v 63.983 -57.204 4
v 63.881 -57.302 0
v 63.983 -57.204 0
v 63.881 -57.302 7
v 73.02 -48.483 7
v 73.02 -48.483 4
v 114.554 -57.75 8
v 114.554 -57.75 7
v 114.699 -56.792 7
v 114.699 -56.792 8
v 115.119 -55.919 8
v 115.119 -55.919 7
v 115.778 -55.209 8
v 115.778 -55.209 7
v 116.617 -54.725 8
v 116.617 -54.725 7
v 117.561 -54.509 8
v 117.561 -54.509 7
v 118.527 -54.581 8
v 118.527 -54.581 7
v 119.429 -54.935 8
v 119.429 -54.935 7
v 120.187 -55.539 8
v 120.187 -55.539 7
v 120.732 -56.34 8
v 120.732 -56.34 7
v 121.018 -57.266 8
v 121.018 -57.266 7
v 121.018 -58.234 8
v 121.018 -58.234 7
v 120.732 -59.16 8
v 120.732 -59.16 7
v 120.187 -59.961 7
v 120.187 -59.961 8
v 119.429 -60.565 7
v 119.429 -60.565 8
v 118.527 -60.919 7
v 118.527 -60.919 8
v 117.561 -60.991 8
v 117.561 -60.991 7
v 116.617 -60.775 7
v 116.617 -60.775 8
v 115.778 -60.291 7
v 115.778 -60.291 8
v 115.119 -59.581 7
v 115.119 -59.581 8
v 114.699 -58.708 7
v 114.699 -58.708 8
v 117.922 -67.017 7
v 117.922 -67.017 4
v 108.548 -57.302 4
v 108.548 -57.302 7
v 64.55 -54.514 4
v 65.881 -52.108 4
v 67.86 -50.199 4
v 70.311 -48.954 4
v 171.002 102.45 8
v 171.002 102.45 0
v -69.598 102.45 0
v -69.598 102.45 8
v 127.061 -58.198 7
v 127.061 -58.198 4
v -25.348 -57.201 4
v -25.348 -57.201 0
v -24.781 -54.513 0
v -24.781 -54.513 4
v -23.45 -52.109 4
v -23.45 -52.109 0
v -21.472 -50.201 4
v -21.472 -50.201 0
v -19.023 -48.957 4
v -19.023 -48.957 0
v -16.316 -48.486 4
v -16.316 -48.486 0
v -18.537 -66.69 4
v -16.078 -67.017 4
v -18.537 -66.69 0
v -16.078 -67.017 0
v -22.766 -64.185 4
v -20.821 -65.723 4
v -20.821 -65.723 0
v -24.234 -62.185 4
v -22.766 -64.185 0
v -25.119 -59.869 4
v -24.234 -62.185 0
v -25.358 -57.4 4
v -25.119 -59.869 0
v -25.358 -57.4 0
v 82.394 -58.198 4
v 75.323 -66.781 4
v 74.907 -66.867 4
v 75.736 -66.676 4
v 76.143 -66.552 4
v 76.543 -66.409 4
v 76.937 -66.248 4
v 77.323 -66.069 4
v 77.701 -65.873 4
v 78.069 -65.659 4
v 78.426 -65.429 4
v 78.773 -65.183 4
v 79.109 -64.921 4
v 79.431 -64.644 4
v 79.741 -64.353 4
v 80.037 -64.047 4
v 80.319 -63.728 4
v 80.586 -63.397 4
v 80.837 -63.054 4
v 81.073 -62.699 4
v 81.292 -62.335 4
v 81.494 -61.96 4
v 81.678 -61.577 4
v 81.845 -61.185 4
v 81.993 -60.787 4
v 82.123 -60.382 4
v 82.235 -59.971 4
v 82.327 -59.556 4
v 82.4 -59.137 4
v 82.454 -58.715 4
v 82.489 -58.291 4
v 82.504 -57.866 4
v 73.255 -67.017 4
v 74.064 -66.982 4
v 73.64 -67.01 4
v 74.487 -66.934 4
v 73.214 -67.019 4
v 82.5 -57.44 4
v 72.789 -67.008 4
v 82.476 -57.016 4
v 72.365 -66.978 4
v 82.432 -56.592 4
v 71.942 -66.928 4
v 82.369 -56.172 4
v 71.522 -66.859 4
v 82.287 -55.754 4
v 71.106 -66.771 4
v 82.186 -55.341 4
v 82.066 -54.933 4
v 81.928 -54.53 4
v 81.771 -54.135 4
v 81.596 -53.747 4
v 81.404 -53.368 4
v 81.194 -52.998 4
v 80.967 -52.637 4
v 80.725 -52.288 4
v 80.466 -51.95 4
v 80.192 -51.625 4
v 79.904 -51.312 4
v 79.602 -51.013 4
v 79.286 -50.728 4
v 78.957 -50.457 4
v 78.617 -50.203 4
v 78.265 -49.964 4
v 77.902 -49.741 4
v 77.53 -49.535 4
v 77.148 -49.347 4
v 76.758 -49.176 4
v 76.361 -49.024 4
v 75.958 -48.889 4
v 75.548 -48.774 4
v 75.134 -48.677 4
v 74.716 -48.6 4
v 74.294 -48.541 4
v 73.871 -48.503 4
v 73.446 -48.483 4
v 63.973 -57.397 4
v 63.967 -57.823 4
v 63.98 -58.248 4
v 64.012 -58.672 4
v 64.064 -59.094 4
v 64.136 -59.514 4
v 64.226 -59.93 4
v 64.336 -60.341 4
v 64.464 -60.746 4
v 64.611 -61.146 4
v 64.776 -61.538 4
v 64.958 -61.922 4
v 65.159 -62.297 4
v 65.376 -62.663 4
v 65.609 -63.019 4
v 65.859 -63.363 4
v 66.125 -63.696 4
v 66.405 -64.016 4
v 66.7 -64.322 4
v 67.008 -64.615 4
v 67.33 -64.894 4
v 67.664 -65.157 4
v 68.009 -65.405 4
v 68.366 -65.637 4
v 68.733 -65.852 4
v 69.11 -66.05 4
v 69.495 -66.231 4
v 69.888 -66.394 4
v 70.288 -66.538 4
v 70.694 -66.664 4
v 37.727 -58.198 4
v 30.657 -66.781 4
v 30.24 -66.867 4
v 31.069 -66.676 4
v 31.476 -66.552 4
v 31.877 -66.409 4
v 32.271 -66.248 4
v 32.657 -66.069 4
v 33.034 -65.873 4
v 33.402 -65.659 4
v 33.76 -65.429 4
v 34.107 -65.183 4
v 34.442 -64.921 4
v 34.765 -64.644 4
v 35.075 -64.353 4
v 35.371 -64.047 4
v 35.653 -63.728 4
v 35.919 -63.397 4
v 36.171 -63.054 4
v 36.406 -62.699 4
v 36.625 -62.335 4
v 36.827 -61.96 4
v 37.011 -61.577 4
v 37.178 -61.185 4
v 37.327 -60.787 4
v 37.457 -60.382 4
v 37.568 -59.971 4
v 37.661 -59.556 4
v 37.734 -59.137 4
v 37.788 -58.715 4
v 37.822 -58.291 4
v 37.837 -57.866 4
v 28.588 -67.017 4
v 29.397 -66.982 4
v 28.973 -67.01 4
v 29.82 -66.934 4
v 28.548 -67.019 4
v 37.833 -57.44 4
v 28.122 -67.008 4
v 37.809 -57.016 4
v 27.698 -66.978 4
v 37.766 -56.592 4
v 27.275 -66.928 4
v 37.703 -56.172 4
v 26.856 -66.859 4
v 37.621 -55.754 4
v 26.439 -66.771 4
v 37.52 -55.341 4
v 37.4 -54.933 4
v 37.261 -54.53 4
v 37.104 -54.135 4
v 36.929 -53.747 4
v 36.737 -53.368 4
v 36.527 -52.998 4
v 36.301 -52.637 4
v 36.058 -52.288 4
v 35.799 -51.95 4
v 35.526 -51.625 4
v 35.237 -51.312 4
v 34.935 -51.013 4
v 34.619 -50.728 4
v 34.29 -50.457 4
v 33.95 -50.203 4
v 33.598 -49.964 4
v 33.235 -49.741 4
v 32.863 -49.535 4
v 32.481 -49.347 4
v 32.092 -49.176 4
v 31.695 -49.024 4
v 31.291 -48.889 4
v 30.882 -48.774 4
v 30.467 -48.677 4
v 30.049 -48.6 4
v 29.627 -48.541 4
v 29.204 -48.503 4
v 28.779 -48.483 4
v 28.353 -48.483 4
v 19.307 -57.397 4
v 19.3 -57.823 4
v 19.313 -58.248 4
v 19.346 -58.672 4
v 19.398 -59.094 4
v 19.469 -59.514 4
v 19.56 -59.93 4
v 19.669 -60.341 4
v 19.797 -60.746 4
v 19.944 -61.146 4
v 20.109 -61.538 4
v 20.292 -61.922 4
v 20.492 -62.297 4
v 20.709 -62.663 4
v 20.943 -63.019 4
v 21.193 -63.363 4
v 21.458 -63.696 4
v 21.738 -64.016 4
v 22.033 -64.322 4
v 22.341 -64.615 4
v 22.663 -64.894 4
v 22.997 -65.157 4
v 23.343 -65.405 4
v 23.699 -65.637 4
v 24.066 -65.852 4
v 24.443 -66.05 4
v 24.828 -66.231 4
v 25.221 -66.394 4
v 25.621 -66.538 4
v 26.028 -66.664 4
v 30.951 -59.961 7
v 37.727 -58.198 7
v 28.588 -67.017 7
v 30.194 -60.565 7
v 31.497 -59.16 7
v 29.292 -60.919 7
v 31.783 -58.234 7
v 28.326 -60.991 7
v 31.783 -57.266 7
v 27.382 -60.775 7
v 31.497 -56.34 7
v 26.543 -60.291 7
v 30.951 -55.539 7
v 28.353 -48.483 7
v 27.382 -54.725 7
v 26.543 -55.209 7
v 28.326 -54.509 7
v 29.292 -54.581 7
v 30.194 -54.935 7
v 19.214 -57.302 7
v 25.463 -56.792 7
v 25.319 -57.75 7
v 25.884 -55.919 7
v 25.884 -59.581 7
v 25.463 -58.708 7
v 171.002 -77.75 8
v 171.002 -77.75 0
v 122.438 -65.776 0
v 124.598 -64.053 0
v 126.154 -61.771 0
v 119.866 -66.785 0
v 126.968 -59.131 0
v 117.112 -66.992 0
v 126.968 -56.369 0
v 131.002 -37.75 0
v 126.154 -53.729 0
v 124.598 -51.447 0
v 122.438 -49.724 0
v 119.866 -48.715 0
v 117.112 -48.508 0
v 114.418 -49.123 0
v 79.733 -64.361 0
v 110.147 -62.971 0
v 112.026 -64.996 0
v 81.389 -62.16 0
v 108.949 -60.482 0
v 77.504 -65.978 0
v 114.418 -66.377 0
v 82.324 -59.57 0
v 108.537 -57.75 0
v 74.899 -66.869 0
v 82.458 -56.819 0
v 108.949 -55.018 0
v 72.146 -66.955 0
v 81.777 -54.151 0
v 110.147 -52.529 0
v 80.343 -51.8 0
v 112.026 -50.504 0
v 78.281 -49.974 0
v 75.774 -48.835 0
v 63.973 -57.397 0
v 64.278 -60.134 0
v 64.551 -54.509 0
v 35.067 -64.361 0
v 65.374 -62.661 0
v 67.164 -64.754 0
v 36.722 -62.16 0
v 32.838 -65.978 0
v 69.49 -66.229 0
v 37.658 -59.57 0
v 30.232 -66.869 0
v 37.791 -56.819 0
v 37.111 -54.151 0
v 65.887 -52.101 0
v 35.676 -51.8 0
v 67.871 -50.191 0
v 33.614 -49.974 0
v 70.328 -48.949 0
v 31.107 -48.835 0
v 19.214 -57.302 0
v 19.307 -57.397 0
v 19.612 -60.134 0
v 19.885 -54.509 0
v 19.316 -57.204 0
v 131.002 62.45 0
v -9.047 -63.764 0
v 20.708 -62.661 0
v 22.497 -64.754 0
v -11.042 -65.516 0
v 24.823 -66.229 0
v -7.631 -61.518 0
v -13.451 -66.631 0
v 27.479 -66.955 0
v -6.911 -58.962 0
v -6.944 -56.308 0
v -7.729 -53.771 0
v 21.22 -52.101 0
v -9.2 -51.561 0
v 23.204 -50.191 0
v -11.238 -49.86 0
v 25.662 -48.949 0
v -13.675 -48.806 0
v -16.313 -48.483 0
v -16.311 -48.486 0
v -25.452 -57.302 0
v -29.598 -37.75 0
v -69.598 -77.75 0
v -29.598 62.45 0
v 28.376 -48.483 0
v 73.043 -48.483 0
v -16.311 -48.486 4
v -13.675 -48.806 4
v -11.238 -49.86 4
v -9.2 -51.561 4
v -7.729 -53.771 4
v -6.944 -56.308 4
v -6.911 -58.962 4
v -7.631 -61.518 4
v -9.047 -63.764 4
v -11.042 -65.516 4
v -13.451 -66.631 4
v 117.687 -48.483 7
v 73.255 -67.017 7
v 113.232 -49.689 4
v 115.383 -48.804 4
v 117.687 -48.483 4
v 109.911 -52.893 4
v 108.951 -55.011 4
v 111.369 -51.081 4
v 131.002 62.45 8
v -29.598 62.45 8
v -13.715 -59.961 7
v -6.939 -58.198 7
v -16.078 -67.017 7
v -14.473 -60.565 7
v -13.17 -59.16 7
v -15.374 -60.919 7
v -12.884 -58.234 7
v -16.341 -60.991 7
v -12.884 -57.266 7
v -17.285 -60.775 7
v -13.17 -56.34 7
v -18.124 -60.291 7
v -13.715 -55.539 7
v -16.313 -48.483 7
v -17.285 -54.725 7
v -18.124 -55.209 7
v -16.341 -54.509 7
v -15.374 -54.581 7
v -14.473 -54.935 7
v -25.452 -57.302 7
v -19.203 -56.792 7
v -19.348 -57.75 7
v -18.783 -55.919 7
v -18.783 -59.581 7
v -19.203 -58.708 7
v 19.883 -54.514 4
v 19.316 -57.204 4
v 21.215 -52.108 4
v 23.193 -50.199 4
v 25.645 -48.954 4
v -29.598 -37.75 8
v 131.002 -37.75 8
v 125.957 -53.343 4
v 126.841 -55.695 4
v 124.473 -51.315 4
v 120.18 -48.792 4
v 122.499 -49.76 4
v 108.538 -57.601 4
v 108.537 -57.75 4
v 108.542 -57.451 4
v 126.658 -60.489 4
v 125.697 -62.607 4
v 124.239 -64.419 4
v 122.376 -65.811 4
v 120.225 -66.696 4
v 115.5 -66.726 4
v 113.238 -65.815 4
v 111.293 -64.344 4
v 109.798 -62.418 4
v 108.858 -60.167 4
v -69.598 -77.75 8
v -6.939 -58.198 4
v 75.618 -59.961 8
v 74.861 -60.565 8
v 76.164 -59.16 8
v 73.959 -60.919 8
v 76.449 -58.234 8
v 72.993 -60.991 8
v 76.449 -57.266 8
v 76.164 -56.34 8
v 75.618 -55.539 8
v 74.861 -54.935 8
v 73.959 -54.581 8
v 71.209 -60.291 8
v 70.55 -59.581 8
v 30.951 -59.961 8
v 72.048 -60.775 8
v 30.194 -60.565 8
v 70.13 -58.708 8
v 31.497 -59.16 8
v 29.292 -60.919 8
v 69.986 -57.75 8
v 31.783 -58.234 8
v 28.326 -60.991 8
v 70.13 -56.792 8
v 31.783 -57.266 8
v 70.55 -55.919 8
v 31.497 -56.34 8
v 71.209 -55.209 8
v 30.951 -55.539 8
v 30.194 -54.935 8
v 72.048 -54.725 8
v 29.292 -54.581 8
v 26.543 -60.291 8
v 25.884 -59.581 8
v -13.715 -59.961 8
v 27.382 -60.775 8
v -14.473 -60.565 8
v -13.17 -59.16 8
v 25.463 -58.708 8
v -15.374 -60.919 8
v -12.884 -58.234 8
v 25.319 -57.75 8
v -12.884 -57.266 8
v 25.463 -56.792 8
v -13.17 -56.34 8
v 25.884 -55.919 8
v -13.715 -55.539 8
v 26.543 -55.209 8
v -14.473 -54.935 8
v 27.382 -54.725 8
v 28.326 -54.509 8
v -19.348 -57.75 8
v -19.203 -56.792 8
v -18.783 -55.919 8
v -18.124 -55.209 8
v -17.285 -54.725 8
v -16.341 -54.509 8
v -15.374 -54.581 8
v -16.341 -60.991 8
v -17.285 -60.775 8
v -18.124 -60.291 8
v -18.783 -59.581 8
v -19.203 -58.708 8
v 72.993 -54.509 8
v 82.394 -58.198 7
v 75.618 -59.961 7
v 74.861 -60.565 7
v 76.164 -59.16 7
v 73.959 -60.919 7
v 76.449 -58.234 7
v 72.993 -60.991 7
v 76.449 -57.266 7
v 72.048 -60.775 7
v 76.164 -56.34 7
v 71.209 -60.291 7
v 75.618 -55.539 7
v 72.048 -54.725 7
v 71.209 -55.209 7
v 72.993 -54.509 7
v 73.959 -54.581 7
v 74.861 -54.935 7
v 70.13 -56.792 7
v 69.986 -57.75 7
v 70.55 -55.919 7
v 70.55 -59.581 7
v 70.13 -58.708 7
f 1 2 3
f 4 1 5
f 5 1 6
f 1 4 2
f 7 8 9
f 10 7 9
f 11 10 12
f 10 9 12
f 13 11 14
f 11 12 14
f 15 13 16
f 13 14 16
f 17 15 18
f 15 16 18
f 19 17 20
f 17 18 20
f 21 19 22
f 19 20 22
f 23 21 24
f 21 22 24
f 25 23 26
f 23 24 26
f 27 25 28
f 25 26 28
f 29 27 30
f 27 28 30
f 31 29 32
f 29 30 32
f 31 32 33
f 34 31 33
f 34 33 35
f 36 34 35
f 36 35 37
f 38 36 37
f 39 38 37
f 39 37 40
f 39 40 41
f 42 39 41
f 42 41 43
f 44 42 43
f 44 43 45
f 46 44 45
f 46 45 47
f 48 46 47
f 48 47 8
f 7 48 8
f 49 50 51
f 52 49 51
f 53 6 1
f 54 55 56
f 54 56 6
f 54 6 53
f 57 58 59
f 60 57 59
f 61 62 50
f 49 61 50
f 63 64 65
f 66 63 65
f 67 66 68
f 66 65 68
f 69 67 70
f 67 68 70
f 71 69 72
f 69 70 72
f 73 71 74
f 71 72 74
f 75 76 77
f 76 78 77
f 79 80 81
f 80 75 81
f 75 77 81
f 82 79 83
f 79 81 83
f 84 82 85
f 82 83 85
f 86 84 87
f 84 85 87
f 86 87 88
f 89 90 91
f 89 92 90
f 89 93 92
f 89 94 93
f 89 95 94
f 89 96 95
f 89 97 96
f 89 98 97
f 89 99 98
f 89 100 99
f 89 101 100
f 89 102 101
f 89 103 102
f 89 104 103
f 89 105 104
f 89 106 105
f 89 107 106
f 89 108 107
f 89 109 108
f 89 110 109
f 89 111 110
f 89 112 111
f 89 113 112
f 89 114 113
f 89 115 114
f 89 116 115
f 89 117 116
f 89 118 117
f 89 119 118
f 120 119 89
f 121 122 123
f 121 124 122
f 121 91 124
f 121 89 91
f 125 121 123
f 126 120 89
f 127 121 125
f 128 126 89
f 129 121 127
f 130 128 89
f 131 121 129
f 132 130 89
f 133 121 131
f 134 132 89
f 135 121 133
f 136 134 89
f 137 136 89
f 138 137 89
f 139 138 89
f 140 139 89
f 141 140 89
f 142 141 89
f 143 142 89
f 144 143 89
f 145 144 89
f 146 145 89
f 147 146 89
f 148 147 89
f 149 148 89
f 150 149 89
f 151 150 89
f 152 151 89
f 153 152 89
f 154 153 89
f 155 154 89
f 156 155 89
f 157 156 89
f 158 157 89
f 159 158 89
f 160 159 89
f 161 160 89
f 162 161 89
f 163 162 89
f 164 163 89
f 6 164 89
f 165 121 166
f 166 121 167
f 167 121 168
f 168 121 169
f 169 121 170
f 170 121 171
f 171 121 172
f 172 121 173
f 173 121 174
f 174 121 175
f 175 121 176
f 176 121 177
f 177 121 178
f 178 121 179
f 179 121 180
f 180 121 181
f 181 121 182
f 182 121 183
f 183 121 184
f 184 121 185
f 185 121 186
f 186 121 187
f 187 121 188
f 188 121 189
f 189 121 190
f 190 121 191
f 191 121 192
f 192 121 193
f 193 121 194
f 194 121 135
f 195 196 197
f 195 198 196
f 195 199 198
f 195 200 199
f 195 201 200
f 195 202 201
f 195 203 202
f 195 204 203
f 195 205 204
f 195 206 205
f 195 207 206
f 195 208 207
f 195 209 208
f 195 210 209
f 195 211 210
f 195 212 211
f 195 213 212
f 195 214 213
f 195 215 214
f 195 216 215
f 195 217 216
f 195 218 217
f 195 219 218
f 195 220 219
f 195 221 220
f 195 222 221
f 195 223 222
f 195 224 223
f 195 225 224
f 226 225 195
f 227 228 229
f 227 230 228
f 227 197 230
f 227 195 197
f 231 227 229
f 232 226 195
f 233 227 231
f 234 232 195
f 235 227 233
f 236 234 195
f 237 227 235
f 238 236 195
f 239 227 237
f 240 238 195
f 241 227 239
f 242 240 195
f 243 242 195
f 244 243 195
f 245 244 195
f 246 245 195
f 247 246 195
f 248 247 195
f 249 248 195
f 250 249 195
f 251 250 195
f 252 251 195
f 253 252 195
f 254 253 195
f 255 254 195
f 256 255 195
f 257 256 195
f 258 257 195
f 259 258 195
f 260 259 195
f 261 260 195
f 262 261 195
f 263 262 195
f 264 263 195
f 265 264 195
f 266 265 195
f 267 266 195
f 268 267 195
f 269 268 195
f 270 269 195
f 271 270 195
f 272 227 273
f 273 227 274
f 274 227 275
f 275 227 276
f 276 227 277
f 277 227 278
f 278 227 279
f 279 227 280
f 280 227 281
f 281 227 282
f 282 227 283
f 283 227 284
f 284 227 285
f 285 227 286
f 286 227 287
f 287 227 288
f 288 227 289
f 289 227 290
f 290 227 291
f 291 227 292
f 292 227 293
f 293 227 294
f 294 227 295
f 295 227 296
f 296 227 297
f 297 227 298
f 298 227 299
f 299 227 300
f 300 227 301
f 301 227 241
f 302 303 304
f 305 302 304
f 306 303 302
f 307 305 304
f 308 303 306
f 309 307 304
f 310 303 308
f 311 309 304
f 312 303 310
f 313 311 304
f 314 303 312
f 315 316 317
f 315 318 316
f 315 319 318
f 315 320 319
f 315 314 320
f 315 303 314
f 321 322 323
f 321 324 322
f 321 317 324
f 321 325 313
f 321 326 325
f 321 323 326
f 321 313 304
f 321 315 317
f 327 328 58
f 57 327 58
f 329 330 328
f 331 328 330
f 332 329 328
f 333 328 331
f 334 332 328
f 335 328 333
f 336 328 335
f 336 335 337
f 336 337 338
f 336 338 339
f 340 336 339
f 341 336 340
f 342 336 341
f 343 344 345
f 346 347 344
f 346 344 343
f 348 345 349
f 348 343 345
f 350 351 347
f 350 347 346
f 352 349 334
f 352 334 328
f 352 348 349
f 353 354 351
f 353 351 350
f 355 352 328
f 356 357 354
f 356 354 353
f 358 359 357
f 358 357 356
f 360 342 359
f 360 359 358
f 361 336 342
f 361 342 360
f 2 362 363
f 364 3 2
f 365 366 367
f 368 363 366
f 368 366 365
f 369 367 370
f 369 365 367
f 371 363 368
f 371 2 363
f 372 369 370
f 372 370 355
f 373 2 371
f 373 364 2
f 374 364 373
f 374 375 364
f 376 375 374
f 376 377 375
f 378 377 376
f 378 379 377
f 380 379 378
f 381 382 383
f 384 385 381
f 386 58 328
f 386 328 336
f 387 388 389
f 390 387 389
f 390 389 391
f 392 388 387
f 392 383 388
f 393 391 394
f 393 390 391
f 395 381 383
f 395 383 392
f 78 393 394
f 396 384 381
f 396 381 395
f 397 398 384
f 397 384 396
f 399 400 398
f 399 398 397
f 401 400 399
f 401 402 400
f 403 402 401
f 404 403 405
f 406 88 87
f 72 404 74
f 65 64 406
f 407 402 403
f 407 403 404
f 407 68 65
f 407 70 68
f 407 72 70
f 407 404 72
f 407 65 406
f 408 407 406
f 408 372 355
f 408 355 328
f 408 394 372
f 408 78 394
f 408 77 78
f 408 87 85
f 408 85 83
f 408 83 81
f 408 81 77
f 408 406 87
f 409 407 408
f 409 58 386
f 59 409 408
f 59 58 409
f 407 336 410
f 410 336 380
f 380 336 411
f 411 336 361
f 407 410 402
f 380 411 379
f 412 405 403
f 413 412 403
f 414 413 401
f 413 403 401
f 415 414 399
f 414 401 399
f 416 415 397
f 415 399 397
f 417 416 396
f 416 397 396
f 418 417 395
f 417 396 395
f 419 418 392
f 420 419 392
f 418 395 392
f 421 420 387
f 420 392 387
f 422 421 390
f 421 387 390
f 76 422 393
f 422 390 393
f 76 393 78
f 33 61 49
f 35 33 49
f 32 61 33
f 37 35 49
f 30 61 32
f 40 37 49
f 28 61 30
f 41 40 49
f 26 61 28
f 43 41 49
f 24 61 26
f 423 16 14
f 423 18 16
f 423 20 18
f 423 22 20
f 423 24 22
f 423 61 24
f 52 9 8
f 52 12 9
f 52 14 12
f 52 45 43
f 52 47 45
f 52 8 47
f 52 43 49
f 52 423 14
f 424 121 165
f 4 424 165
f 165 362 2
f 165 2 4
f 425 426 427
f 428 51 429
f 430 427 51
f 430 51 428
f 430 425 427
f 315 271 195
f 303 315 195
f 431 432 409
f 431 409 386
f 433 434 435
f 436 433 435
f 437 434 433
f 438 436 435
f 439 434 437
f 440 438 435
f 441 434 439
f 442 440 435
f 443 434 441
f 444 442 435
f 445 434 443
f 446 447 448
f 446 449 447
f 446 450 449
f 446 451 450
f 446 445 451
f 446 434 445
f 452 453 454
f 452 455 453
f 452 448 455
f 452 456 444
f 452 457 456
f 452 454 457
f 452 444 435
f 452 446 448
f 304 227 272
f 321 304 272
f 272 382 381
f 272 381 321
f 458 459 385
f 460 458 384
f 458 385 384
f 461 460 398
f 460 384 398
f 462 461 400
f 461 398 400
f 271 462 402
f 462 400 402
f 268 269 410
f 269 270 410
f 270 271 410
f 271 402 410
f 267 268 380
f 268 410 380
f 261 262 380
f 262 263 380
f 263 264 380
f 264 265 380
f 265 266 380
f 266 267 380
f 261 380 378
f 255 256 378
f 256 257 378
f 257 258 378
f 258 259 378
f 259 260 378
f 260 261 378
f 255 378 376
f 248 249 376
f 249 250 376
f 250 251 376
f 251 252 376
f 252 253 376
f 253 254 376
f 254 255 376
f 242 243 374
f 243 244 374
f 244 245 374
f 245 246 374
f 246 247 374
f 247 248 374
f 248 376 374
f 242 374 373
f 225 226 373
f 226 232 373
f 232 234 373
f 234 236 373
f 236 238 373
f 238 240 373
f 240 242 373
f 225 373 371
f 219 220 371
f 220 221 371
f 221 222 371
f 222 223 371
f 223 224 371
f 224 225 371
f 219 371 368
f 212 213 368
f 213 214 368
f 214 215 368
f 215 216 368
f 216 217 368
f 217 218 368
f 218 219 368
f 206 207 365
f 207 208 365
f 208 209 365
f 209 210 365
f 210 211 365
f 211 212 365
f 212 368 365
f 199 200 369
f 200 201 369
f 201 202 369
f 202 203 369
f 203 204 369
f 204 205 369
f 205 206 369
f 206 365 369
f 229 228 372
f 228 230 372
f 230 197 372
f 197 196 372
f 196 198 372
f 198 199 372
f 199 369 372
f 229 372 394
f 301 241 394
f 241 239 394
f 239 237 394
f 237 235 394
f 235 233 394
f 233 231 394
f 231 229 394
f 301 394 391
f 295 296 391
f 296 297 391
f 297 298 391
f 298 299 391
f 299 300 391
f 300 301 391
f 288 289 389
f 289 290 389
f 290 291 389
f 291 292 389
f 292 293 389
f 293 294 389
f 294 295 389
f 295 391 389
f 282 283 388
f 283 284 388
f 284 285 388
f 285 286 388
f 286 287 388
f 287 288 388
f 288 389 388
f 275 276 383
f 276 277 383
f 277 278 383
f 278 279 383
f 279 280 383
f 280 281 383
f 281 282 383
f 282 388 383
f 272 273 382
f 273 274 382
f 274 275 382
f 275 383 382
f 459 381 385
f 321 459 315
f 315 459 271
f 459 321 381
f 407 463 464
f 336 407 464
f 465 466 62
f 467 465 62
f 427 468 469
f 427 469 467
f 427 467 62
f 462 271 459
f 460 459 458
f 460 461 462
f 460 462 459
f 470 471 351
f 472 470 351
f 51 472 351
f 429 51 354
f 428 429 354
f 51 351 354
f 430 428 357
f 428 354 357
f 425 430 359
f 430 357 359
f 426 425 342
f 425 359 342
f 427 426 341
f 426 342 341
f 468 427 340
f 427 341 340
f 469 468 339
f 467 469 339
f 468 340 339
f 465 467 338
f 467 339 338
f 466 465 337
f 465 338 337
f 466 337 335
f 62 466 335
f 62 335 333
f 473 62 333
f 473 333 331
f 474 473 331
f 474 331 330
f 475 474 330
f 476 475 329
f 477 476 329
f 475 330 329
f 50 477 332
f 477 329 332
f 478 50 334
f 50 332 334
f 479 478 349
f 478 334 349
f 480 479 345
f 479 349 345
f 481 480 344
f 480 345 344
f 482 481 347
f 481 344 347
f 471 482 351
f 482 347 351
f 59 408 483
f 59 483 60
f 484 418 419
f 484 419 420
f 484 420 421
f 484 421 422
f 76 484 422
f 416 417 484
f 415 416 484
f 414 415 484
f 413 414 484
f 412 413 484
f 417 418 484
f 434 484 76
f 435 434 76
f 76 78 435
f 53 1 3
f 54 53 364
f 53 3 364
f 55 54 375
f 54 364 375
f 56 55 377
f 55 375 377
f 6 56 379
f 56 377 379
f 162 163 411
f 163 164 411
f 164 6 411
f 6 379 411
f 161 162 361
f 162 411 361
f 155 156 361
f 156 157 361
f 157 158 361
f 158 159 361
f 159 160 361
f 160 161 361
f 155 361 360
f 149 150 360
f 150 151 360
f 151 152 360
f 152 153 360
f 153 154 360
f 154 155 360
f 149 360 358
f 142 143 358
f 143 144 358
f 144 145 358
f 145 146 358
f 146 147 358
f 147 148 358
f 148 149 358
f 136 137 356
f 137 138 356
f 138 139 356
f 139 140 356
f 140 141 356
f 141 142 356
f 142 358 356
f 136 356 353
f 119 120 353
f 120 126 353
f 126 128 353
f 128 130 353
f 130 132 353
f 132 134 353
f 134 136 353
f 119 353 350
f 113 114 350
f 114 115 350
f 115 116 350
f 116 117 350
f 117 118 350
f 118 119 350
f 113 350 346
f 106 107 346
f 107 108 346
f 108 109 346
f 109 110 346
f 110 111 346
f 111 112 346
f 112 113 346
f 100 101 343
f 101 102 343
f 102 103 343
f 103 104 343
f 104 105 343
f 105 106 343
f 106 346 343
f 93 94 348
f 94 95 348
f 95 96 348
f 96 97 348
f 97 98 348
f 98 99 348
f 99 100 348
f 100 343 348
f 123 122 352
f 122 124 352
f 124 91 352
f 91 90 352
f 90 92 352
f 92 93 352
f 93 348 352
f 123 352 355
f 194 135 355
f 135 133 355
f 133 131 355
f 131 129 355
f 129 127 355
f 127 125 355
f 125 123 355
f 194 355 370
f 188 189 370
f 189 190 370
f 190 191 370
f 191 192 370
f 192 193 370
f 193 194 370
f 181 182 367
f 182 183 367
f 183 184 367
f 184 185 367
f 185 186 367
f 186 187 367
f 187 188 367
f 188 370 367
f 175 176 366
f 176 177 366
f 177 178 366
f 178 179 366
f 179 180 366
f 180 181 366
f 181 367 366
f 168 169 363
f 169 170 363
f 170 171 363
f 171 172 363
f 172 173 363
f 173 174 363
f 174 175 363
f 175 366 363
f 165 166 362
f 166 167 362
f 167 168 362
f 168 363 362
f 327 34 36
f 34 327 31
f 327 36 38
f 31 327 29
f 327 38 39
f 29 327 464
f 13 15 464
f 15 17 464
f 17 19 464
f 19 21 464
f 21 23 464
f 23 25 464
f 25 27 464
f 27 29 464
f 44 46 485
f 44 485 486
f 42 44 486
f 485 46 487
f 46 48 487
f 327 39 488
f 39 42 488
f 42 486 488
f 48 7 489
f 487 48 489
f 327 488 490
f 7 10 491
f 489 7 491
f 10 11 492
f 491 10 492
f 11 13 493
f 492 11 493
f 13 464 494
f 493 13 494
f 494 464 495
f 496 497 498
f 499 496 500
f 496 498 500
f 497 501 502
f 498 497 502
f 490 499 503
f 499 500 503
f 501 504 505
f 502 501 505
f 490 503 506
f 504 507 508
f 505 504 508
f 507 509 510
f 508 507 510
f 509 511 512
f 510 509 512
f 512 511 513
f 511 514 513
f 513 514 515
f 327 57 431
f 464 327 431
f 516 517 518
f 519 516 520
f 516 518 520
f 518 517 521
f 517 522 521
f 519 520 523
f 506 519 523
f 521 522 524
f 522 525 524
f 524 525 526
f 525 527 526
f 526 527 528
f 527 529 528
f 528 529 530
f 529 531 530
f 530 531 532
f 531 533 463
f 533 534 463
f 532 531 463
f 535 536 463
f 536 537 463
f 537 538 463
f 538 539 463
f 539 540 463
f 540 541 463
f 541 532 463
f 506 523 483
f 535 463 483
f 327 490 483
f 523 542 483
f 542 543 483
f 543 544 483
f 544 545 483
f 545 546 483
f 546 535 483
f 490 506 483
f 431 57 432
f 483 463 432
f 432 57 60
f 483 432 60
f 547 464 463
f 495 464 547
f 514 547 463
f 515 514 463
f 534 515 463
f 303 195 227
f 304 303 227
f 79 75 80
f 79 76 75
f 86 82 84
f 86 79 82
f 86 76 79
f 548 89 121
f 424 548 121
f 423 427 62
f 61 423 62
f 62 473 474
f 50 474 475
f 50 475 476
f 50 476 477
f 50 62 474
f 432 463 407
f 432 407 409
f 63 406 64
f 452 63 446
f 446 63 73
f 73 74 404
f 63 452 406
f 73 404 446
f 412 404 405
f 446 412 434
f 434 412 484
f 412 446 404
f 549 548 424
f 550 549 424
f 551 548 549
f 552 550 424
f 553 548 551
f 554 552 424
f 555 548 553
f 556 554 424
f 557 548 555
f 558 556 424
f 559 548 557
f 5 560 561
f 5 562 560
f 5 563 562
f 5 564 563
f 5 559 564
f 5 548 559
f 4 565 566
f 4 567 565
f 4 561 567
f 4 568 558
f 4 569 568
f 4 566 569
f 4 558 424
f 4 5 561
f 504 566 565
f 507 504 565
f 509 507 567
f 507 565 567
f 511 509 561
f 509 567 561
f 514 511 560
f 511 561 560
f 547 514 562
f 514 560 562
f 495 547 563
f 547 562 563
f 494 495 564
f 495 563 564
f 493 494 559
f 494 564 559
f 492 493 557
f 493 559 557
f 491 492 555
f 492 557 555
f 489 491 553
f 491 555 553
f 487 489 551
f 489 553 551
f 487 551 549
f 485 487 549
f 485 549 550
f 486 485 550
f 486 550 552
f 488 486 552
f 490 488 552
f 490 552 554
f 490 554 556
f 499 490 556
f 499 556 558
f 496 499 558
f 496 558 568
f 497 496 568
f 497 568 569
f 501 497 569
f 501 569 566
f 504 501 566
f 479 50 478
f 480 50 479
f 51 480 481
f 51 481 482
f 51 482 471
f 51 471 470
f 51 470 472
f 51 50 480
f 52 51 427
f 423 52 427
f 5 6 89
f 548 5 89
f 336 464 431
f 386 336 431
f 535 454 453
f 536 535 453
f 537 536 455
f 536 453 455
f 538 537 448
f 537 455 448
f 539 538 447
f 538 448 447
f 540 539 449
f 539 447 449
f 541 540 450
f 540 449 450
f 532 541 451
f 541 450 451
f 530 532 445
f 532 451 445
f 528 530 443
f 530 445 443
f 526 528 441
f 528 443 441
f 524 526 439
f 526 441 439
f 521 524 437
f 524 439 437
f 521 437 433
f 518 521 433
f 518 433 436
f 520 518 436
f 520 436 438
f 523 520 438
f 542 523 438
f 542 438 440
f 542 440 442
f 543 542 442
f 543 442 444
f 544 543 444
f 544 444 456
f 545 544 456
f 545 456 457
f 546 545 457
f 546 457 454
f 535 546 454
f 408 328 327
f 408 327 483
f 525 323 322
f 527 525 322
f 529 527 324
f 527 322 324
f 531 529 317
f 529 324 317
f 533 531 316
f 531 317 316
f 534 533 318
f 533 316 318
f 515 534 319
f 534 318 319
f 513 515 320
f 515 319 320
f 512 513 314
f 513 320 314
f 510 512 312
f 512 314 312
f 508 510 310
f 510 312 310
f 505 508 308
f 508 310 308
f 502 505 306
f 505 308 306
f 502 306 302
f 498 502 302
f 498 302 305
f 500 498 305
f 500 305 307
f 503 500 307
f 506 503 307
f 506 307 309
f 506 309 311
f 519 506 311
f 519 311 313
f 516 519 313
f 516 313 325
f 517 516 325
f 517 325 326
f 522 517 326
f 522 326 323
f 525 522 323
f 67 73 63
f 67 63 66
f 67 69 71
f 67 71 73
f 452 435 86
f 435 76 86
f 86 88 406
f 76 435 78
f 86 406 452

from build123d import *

# Parameters (mm, degrees)
SKETCH1_W                      = 240.6
SKETCH1_H                      = 180.2
BOSS_EXTRUDE1_DEPTH            = 8
SKETCH2_W                      = 160.6
SKETCH2_H                      = 100.2
CUT_EXTRUDE1_DEPTH             = 200.503872501
CUT_EXTRUDE2_DEPTH             = 7
CUT_EXTRUDE3_DEPTH             = 7
CUT_EXTRUDE4_DEPTH             = 7
CUT_EXTRUDE5_DEPTH             = 7
F_6_5_6_5_DIAMETER_HOLE1_D     = 6.5
F_6_5_6_5_DIAMETER_HOLE1_DEPTH = 8
SKETCH9_R                      = 9.267416037
SKETCH9_R_2                    = 9.269178346
SKETCH9_R_3                    = 9.266671768
CUT_EXTRUDE7_DEPTH             = 4


with BuildPart() as part:
    # Sketch1 → Boss-Extrude1 (new body)
    with BuildSketch(Plane(origin=(0, 0, 0), x_dir=(-1, 0, 0), z_dir=(0, 0, -1))):
        with Locations((-50.702318109, 12.34999924)):
            Rectangle(SKETCH1_W, SKETCH1_H)
    extrude(amount=-BOSS_EXTRUDE1_DEPTH)

    # Sketch2 → Cut-Extrude1 (cut, through all)
    with BuildSketch(Plane.XY.offset(8)):
        with Locations((50.702318109, 12.34999924)):
            Rectangle(SKETCH2_W, SKETCH2_H)
    extrude(amount=-CUT_EXTRUDE1_DEPTH, mode=Mode.SUBTRACT)

    # Sketch3 → Cut-Extrude2 (cut)
    with BuildSketch(Plane(origin=(0, 0, 0), x_dir=(-1, 0, 0), z_dir=(0, 0, -1))):
        Polygon((-117.686768689, -48.483328992), (-127.060792146, -58.198146757), (-117.921667286, -67.016672528), (-108.547643828, -57.301854763), align=None)
    extrude(amount=-CUT_EXTRUDE2_DEPTH, mode=Mode.SUBTRACT)

    # Sketch4 → Cut-Extrude3 (cut)
    with BuildSketch(Plane(origin=(0, 0, 0), x_dir=(-1, 0, 0), z_dir=(0, 0, -1))):
        Polygon((6.939207854, -58.198146757), (16.078332714, -67.016672528), (25.452356172, -57.301854763), (16.313231311, -48.483328992), align=None)
    extrude(amount=-CUT_EXTRUDE3_DEPTH, mode=Mode.SUBTRACT)

    # Sketch5 → Cut-Extrude4 (cut)
    with BuildSketch(Plane(origin=(0, 0, 0), x_dir=(-1, 0, 0), z_dir=(0, 0, -1))):
        Polygon((-37.727458813, -58.198146757), (-28.588333952, -67.016672528), (-19.214310494, -57.301854763), (-28.353435355, -48.483328992), align=None)
    extrude(amount=-CUT_EXTRUDE4_DEPTH, mode=Mode.SUBTRACT)

    # Sketch6 → Cut-Extrude5 (cut)
    with BuildSketch(Plane(origin=(0, 0, 0), x_dir=(-1, 0, 0), z_dir=(0, 0, -1))):
        Polygon((-82.39412548, -58.198146757), (-73.255000619, -67.016672528), (-63.880977161, -57.301854763), (-73.020102022, -48.483328992), align=None)
    extrude(amount=-CUT_EXTRUDE5_DEPTH, mode=Mode.SUBTRACT)

    # Ø6.5 (6.5) Diameter Hole1
    with Locations(Plane.XY.offset(8)):
        with Locations((117.804217987, -57.75000076), (-16.097681891, -57.75000076), (28.568984776, -57.75000076), (73.235651442, -57.75000076)):
            Hole(F_6_5_6_5_DIAMETER_HOLE1_D / 2, depth=F_6_5_6_5_DIAMETER_HOLE1_DEPTH)

    # Sketch9 → Cut-Extrude7 (cut)
    with BuildSketch(Plane(origin=(0, 0, 0), x_dir=(-1, 0, 0), z_dir=(0, 0, -1))):
        with Locations((-117.804217987, -57.75000076)):
            Circle(SKETCH9_R)
        with Locations((-73.235651442, -57.75000076)):
            Circle(SKETCH9_R_2)
        with Locations((-28.568984776, -57.75000076)):
            Circle(SKETCH9_R_2)
        with Locations((16.097681891, -57.75000076)):
            Circle(SKETCH9_R_3)
    extrude(amount=-CUT_EXTRUDE7_DEPTH, mode=Mode.SUBTRACT)


solid = part.part
